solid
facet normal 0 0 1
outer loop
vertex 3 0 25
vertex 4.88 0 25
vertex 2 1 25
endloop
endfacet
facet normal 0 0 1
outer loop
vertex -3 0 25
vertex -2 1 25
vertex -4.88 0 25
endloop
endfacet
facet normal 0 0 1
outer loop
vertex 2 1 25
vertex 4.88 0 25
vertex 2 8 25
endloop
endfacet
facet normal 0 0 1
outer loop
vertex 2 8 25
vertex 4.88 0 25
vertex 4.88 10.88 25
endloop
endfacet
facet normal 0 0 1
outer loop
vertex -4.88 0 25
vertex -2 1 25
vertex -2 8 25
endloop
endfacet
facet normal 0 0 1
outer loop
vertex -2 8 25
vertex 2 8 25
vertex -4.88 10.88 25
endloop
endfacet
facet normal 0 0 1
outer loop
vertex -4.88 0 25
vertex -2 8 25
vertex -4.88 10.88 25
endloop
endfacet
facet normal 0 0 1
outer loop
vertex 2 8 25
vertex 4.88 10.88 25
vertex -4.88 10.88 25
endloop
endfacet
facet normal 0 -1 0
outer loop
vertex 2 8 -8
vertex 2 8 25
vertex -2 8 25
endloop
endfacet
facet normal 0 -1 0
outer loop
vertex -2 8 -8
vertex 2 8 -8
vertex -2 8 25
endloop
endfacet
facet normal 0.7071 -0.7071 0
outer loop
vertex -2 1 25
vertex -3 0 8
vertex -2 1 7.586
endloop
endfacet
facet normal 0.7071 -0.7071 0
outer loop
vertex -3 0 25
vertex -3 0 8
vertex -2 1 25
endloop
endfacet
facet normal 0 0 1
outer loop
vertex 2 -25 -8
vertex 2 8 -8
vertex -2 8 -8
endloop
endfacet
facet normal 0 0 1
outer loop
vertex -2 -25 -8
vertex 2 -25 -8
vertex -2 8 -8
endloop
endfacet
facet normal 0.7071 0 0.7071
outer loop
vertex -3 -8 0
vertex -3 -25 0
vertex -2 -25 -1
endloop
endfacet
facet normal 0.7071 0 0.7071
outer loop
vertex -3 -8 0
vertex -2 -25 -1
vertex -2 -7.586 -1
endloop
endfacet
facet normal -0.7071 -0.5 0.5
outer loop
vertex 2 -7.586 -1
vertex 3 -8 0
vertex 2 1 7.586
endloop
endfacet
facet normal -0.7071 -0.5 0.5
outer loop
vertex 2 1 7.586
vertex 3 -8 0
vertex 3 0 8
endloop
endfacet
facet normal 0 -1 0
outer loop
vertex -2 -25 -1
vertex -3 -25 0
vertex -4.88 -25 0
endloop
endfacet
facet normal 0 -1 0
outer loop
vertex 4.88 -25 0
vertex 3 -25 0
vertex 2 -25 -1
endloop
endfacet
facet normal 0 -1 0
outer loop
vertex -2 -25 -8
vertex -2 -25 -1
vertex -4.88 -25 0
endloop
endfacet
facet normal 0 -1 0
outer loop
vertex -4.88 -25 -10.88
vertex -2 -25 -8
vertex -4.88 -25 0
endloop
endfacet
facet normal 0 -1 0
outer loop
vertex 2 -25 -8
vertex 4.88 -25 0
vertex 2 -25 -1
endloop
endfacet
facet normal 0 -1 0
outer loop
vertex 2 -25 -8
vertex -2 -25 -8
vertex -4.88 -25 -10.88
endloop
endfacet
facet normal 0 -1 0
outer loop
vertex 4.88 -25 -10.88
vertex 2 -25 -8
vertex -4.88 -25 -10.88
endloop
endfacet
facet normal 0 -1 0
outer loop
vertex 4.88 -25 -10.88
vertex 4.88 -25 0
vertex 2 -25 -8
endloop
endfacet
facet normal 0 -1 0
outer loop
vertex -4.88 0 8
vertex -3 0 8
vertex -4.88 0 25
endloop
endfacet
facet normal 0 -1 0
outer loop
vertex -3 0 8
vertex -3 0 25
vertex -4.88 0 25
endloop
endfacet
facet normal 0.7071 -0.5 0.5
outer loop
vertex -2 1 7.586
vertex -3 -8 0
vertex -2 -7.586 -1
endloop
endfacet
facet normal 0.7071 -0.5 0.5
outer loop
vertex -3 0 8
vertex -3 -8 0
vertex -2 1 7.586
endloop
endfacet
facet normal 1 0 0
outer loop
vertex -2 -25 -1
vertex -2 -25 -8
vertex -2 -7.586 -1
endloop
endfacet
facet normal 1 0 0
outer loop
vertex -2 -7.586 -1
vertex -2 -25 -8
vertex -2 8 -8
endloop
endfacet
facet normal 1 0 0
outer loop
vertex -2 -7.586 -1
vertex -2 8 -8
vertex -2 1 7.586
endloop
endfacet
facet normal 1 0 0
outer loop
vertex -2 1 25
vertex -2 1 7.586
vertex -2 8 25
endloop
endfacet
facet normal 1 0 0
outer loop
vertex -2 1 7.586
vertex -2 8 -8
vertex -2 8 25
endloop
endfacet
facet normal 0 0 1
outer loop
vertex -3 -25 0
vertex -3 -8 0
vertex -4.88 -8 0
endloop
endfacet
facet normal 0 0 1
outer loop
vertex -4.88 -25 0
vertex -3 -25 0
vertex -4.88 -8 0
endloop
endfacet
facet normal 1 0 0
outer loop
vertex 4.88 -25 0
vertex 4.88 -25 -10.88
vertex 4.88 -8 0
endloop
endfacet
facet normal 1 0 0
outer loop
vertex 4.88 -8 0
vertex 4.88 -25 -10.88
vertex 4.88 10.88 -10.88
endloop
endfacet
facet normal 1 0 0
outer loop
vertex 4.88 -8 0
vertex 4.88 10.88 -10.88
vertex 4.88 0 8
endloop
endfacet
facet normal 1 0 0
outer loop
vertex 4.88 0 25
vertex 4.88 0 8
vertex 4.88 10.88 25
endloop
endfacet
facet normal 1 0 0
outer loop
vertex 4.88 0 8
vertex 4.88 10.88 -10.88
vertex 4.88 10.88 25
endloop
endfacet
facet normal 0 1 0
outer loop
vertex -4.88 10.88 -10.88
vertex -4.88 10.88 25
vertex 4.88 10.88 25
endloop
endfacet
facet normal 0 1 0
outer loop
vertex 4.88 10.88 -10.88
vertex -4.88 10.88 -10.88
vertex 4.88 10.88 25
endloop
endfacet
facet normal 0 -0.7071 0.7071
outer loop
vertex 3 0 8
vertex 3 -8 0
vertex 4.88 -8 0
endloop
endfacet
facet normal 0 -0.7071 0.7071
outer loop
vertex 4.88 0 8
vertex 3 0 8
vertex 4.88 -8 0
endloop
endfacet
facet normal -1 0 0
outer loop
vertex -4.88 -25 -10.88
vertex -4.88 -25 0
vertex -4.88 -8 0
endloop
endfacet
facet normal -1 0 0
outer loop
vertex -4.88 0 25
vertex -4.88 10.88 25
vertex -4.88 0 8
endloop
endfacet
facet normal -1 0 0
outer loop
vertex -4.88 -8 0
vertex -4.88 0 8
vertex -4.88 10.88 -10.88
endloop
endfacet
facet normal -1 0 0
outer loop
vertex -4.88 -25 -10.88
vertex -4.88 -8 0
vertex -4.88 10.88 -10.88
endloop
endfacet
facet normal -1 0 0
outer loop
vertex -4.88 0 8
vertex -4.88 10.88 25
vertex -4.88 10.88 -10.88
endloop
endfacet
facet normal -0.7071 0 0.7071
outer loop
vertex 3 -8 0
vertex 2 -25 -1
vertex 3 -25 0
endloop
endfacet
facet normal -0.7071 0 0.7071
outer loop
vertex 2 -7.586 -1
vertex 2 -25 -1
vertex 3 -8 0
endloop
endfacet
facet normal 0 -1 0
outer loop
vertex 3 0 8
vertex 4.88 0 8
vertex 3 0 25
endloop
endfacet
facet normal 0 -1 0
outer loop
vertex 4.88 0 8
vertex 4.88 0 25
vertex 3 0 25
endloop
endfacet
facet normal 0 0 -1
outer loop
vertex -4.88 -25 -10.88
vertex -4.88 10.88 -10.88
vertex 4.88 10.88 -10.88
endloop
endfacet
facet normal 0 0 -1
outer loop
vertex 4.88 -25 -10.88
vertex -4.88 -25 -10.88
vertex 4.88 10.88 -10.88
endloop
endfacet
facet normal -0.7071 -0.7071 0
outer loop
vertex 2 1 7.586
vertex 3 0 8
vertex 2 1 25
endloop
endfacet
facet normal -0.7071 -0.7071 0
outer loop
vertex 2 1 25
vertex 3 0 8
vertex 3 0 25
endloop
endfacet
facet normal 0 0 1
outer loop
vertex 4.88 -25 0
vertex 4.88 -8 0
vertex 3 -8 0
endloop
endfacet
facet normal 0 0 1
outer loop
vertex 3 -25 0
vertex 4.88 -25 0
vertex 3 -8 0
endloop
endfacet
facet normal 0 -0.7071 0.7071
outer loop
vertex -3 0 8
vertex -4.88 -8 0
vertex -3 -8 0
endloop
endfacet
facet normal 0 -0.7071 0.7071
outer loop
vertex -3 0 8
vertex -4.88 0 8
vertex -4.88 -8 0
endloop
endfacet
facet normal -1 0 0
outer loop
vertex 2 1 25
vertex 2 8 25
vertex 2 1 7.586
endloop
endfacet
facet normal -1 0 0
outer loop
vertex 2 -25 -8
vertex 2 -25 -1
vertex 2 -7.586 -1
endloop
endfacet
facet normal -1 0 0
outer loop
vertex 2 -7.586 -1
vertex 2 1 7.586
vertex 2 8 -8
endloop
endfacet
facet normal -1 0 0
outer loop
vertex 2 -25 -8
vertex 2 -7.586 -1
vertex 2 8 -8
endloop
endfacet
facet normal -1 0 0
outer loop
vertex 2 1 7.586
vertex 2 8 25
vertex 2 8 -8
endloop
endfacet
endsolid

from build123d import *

# Parameters (mm, degrees)
F3_SIZE = 8
F4_SIZE = 1


with BuildPart() as f2:
    # F2: sweep along a path in F0
    with BuildLine(Plane.YZ) as f2_path:
        Line((-25, 0), (0, 0))
        Line((0, 0), (0, 25))
    # F1 (on Front) → F2 (sweep)
    with BuildSketch(Plane.XZ):
        Polygon((-2, -8), (-2, 0), (-4.88, 0), (-4.88, -10.88), (4.88, -10.88), (4.88, 0), (2, 0), (2, -8), align=None)
    sweep(path=f2_path.line, transition=Transition.RIGHT)

    # F3
    f3_edges = [f2.edges().sort_by_distance(p)[0] for p in [
        (-3.44, 0, 0),
        (3.44, 0, 0),
    ]]
    chamfer(f3_edges, length=F3_SIZE)

    # F4
    f4_edges = [f2.edges().sort_by_distance(p)[0] for p in [
        (-2, -16.5, 0),
        (-2, 0, 16.5),
        (2, 0, 16.5),
        (2, -16.5, 0),
        (-2, -4, 4),
        (2, -4, 4),
    ]]
    chamfer(f4_edges, length=F4_SIZE)


solid = f2.part
